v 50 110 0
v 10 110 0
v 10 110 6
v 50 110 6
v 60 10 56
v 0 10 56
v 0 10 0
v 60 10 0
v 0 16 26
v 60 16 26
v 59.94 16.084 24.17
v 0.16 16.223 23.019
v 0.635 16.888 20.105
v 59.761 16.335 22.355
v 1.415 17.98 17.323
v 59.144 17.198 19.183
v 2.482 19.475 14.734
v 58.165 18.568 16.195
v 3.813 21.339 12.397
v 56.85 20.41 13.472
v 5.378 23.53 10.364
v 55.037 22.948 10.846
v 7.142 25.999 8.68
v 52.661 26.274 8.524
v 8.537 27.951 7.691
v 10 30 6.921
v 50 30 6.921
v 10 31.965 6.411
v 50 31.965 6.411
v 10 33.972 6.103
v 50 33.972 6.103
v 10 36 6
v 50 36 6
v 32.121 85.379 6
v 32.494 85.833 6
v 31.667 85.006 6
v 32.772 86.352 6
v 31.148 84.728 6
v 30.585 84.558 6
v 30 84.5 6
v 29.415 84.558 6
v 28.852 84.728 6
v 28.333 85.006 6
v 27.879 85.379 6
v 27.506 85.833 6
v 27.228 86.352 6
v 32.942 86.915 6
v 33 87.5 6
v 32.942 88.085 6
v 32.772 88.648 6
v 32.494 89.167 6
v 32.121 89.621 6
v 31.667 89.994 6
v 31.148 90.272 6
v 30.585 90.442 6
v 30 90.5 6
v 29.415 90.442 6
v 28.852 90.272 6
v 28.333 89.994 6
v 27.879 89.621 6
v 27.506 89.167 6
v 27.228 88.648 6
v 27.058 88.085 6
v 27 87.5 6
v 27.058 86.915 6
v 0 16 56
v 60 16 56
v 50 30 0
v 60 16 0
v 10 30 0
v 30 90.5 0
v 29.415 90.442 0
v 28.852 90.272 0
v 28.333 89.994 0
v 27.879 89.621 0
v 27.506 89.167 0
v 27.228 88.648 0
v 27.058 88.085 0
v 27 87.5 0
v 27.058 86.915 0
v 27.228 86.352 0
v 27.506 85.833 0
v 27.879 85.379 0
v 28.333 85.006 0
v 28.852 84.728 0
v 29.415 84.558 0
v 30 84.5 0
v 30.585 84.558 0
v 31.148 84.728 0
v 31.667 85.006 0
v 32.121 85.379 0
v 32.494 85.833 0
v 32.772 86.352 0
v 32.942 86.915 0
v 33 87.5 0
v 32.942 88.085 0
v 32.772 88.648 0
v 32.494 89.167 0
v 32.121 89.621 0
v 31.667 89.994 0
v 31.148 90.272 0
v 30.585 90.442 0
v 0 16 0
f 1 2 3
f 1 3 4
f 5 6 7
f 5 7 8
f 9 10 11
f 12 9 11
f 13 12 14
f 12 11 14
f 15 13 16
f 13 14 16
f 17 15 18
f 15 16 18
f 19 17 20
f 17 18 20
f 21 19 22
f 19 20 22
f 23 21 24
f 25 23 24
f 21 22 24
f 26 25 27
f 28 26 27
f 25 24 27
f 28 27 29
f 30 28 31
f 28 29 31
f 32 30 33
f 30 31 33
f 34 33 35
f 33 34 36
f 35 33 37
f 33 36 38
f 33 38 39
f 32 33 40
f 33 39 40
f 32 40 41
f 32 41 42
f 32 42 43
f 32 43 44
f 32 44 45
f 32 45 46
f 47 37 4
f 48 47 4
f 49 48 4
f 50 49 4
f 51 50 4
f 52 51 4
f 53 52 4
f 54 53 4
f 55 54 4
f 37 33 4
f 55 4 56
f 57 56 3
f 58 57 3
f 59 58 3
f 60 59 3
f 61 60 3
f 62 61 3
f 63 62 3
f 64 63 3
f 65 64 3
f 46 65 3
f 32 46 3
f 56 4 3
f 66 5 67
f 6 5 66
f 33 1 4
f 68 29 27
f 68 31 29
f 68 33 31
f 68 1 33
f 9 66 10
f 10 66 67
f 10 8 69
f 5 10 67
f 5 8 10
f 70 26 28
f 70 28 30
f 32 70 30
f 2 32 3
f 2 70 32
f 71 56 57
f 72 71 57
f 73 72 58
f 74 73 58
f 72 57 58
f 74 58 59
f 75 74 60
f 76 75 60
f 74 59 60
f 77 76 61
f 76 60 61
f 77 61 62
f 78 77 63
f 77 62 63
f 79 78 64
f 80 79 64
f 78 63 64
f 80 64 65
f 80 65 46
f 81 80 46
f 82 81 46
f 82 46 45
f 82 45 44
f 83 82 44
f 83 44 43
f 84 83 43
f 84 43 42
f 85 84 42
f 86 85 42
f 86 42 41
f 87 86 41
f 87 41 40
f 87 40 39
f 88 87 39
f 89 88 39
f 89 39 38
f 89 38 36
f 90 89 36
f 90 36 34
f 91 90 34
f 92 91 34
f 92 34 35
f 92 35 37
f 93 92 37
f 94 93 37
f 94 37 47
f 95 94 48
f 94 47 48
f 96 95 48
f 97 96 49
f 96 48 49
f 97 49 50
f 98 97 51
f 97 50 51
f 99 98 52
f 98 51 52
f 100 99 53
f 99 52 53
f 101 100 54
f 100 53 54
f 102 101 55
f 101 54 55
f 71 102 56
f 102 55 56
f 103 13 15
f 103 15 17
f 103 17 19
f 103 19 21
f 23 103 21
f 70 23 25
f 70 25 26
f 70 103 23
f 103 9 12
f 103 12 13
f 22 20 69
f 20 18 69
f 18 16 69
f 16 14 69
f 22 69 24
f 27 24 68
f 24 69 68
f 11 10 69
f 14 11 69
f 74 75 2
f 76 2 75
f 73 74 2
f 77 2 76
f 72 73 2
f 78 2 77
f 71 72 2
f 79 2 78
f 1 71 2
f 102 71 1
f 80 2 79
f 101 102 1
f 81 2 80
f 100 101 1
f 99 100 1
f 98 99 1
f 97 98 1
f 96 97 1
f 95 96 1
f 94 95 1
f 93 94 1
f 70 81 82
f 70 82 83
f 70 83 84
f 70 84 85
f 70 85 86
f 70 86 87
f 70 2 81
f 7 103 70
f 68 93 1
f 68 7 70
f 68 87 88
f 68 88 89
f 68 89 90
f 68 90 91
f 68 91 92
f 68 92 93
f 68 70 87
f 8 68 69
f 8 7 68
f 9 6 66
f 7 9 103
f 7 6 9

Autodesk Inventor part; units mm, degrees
ref_plane "YZ Plane" through (0, 0, 0) normal (1, 0, 0) x (0, 1, 0)
ref_plane "XZ Plane" through (0, 0, 0) normal (0, 1, 0) x (-1, 0, 0)
ref_plane "XY Plane" through (0, 0, 0) normal (0, 0, 1) x (1, 0, 0)
sketch "Esquisse2" plane through (0, 0, 0) normal (0, 0, 1) x (1, 0, 0)
  line L0 (10, 110) -> (50, 110)
  line L1 (50, 110) -> (50, 10)
  line L2 (50, 10) -> (10, 10)
  line L3 (10, 10) -> (10, 110)
  line L4 (0, 132) -> (0, -22) construction
  line L5 (-10, 0) -> (60, 0) construction
  point P0 (0, 0)
  dimension "d0" = 40
  dimension "d1" = 100
  dimension "d2" = 10
  dimension "d3" = 10
extrude "Extrusion1" add sketch "Esquisse2" along normal blind 6
sketch "Esquisse3" plane through (0, 0, 6) normal (0, 0, 1) x (1, 0, 0)
  line L0 (50, 10) -> (50, 110) construction
  line L1 (50, 110) -> (10, 110) construction
  line L2 (10, 110) -> (10, 10) construction
  line L3 (10, 10) -> (50, 10) construction
  line L4 (50, 10) -> (10, 10)
  line L5 (10, 10) -> (10, 16)
  line L6 (10, 16) -> (50, 16)
  line L7 (50, 16) -> (50, 10)
  point P0 (0, 0)
  dimension "d6" = 6
extrude "Extrusion2" add sketch "Esquisse3" along normal blind 50
sketch "Esquisse4" plane through (0, 0, 0) normal (0, 0, -1) x (-1, 0, 0)
  line L0 (-50, 10) -> (-50, 110) construction
  line L1 (-10, 10) -> (-50, 10) construction
  line L2 (-10, 110) -> (-10, 10) construction
  line L3 (-50, 110) -> (-10, 110) construction
  line L4 (-10, 110) -> (-50, 110) construction
  line L5 (-50, 110) -> (-50, 65) construction
  line L6 (-50, 65) -> (-10, 65) construction
  line L7 (-10, 65) -> (-10, 110) construction
  circle A0 centre (-30, 87.5) radius 3
  point P0 (0, 0)
  dimension "d9" = 45
  dimension "d10" = 6
  dimension "d11" = 20
  dimension "d12" = 22.5
hole "Perçage1" at (30, 87.5, 0) direction (0, 0, 1) diameter 6 depth 6
sketch "Esquisse5" plane through (10, 10, 0) normal (0, -1, 0) x (1, 0, 0)
  line L0 (0, 0) -> (40, 0) construction
  line L1 (40, 0) -> (40, 56) construction
  line L2 (0, 56) -> (40, 56) construction
  line L3 (0, 0) -> (0, 56) construction
  line L4 (50, 56) -> (-10, 56)
  line L5 (-10, 56) -> (-10, 0)
  line L6 (-10, 0) -> (50, 0)
  line L7 (50, 0) -> (50, 56)
  line L8 (0, 56) -> (40, 56) construction
  point P0 (-10, 0)
  dimension "d20" = 60
  dimension "d21" = 10
extrude "Extrusion3" add sketch "Esquisse5" against normal blind 6
sketch "Esquisse6" plane through (0, 0, 0) normal (0, 0, -1) x (-1, 0, 0)
  line L0 (-10, 110) -> (-10, 16) construction
  line L1 (-50, 110) -> (-10, 110) construction
  line L2 (-50, 16) -> (-50, 110) construction
  line L3 (-60, 16) -> (-50, 16) construction
  line L4 (-60, 10) -> (-60, 16) construction
  line L5 (0, 10) -> (-60, 10) construction
  line L6 (0, 10) -> (0, 16) construction
  line L7 (-10, 16) -> (0, 16) construction
  circle A0 centre (-30, 87.5) radius 3 construction
  line L8 (0, 16) -> (-10, 30)
  line L9 (-60, 16) -> (-50, 30)
  line L10 (0, 16) -> (-10, 16)
  line L11 (-10, 16) -> (-10, 30)
  line L12 (-50, 30) -> (-50, 16)
  line L13 (-60, 16) -> (-50, 16)
  point P0 (0, 0)
  dimension "d24" = 14
  dimension "d25" = 14
extrude "Extrusion4" add sketch "Esquisse6" against normal blind 6
sketch "Sketch7" plane through (50, 110, 6) normal (1, 0, 0) x (0, 0, -1)
  point P0 (6, -110)
fillet "Fillet1" radius 20 1 edges at (30, 16, 6)
properties part number "P005_supportCapteursTripod"
